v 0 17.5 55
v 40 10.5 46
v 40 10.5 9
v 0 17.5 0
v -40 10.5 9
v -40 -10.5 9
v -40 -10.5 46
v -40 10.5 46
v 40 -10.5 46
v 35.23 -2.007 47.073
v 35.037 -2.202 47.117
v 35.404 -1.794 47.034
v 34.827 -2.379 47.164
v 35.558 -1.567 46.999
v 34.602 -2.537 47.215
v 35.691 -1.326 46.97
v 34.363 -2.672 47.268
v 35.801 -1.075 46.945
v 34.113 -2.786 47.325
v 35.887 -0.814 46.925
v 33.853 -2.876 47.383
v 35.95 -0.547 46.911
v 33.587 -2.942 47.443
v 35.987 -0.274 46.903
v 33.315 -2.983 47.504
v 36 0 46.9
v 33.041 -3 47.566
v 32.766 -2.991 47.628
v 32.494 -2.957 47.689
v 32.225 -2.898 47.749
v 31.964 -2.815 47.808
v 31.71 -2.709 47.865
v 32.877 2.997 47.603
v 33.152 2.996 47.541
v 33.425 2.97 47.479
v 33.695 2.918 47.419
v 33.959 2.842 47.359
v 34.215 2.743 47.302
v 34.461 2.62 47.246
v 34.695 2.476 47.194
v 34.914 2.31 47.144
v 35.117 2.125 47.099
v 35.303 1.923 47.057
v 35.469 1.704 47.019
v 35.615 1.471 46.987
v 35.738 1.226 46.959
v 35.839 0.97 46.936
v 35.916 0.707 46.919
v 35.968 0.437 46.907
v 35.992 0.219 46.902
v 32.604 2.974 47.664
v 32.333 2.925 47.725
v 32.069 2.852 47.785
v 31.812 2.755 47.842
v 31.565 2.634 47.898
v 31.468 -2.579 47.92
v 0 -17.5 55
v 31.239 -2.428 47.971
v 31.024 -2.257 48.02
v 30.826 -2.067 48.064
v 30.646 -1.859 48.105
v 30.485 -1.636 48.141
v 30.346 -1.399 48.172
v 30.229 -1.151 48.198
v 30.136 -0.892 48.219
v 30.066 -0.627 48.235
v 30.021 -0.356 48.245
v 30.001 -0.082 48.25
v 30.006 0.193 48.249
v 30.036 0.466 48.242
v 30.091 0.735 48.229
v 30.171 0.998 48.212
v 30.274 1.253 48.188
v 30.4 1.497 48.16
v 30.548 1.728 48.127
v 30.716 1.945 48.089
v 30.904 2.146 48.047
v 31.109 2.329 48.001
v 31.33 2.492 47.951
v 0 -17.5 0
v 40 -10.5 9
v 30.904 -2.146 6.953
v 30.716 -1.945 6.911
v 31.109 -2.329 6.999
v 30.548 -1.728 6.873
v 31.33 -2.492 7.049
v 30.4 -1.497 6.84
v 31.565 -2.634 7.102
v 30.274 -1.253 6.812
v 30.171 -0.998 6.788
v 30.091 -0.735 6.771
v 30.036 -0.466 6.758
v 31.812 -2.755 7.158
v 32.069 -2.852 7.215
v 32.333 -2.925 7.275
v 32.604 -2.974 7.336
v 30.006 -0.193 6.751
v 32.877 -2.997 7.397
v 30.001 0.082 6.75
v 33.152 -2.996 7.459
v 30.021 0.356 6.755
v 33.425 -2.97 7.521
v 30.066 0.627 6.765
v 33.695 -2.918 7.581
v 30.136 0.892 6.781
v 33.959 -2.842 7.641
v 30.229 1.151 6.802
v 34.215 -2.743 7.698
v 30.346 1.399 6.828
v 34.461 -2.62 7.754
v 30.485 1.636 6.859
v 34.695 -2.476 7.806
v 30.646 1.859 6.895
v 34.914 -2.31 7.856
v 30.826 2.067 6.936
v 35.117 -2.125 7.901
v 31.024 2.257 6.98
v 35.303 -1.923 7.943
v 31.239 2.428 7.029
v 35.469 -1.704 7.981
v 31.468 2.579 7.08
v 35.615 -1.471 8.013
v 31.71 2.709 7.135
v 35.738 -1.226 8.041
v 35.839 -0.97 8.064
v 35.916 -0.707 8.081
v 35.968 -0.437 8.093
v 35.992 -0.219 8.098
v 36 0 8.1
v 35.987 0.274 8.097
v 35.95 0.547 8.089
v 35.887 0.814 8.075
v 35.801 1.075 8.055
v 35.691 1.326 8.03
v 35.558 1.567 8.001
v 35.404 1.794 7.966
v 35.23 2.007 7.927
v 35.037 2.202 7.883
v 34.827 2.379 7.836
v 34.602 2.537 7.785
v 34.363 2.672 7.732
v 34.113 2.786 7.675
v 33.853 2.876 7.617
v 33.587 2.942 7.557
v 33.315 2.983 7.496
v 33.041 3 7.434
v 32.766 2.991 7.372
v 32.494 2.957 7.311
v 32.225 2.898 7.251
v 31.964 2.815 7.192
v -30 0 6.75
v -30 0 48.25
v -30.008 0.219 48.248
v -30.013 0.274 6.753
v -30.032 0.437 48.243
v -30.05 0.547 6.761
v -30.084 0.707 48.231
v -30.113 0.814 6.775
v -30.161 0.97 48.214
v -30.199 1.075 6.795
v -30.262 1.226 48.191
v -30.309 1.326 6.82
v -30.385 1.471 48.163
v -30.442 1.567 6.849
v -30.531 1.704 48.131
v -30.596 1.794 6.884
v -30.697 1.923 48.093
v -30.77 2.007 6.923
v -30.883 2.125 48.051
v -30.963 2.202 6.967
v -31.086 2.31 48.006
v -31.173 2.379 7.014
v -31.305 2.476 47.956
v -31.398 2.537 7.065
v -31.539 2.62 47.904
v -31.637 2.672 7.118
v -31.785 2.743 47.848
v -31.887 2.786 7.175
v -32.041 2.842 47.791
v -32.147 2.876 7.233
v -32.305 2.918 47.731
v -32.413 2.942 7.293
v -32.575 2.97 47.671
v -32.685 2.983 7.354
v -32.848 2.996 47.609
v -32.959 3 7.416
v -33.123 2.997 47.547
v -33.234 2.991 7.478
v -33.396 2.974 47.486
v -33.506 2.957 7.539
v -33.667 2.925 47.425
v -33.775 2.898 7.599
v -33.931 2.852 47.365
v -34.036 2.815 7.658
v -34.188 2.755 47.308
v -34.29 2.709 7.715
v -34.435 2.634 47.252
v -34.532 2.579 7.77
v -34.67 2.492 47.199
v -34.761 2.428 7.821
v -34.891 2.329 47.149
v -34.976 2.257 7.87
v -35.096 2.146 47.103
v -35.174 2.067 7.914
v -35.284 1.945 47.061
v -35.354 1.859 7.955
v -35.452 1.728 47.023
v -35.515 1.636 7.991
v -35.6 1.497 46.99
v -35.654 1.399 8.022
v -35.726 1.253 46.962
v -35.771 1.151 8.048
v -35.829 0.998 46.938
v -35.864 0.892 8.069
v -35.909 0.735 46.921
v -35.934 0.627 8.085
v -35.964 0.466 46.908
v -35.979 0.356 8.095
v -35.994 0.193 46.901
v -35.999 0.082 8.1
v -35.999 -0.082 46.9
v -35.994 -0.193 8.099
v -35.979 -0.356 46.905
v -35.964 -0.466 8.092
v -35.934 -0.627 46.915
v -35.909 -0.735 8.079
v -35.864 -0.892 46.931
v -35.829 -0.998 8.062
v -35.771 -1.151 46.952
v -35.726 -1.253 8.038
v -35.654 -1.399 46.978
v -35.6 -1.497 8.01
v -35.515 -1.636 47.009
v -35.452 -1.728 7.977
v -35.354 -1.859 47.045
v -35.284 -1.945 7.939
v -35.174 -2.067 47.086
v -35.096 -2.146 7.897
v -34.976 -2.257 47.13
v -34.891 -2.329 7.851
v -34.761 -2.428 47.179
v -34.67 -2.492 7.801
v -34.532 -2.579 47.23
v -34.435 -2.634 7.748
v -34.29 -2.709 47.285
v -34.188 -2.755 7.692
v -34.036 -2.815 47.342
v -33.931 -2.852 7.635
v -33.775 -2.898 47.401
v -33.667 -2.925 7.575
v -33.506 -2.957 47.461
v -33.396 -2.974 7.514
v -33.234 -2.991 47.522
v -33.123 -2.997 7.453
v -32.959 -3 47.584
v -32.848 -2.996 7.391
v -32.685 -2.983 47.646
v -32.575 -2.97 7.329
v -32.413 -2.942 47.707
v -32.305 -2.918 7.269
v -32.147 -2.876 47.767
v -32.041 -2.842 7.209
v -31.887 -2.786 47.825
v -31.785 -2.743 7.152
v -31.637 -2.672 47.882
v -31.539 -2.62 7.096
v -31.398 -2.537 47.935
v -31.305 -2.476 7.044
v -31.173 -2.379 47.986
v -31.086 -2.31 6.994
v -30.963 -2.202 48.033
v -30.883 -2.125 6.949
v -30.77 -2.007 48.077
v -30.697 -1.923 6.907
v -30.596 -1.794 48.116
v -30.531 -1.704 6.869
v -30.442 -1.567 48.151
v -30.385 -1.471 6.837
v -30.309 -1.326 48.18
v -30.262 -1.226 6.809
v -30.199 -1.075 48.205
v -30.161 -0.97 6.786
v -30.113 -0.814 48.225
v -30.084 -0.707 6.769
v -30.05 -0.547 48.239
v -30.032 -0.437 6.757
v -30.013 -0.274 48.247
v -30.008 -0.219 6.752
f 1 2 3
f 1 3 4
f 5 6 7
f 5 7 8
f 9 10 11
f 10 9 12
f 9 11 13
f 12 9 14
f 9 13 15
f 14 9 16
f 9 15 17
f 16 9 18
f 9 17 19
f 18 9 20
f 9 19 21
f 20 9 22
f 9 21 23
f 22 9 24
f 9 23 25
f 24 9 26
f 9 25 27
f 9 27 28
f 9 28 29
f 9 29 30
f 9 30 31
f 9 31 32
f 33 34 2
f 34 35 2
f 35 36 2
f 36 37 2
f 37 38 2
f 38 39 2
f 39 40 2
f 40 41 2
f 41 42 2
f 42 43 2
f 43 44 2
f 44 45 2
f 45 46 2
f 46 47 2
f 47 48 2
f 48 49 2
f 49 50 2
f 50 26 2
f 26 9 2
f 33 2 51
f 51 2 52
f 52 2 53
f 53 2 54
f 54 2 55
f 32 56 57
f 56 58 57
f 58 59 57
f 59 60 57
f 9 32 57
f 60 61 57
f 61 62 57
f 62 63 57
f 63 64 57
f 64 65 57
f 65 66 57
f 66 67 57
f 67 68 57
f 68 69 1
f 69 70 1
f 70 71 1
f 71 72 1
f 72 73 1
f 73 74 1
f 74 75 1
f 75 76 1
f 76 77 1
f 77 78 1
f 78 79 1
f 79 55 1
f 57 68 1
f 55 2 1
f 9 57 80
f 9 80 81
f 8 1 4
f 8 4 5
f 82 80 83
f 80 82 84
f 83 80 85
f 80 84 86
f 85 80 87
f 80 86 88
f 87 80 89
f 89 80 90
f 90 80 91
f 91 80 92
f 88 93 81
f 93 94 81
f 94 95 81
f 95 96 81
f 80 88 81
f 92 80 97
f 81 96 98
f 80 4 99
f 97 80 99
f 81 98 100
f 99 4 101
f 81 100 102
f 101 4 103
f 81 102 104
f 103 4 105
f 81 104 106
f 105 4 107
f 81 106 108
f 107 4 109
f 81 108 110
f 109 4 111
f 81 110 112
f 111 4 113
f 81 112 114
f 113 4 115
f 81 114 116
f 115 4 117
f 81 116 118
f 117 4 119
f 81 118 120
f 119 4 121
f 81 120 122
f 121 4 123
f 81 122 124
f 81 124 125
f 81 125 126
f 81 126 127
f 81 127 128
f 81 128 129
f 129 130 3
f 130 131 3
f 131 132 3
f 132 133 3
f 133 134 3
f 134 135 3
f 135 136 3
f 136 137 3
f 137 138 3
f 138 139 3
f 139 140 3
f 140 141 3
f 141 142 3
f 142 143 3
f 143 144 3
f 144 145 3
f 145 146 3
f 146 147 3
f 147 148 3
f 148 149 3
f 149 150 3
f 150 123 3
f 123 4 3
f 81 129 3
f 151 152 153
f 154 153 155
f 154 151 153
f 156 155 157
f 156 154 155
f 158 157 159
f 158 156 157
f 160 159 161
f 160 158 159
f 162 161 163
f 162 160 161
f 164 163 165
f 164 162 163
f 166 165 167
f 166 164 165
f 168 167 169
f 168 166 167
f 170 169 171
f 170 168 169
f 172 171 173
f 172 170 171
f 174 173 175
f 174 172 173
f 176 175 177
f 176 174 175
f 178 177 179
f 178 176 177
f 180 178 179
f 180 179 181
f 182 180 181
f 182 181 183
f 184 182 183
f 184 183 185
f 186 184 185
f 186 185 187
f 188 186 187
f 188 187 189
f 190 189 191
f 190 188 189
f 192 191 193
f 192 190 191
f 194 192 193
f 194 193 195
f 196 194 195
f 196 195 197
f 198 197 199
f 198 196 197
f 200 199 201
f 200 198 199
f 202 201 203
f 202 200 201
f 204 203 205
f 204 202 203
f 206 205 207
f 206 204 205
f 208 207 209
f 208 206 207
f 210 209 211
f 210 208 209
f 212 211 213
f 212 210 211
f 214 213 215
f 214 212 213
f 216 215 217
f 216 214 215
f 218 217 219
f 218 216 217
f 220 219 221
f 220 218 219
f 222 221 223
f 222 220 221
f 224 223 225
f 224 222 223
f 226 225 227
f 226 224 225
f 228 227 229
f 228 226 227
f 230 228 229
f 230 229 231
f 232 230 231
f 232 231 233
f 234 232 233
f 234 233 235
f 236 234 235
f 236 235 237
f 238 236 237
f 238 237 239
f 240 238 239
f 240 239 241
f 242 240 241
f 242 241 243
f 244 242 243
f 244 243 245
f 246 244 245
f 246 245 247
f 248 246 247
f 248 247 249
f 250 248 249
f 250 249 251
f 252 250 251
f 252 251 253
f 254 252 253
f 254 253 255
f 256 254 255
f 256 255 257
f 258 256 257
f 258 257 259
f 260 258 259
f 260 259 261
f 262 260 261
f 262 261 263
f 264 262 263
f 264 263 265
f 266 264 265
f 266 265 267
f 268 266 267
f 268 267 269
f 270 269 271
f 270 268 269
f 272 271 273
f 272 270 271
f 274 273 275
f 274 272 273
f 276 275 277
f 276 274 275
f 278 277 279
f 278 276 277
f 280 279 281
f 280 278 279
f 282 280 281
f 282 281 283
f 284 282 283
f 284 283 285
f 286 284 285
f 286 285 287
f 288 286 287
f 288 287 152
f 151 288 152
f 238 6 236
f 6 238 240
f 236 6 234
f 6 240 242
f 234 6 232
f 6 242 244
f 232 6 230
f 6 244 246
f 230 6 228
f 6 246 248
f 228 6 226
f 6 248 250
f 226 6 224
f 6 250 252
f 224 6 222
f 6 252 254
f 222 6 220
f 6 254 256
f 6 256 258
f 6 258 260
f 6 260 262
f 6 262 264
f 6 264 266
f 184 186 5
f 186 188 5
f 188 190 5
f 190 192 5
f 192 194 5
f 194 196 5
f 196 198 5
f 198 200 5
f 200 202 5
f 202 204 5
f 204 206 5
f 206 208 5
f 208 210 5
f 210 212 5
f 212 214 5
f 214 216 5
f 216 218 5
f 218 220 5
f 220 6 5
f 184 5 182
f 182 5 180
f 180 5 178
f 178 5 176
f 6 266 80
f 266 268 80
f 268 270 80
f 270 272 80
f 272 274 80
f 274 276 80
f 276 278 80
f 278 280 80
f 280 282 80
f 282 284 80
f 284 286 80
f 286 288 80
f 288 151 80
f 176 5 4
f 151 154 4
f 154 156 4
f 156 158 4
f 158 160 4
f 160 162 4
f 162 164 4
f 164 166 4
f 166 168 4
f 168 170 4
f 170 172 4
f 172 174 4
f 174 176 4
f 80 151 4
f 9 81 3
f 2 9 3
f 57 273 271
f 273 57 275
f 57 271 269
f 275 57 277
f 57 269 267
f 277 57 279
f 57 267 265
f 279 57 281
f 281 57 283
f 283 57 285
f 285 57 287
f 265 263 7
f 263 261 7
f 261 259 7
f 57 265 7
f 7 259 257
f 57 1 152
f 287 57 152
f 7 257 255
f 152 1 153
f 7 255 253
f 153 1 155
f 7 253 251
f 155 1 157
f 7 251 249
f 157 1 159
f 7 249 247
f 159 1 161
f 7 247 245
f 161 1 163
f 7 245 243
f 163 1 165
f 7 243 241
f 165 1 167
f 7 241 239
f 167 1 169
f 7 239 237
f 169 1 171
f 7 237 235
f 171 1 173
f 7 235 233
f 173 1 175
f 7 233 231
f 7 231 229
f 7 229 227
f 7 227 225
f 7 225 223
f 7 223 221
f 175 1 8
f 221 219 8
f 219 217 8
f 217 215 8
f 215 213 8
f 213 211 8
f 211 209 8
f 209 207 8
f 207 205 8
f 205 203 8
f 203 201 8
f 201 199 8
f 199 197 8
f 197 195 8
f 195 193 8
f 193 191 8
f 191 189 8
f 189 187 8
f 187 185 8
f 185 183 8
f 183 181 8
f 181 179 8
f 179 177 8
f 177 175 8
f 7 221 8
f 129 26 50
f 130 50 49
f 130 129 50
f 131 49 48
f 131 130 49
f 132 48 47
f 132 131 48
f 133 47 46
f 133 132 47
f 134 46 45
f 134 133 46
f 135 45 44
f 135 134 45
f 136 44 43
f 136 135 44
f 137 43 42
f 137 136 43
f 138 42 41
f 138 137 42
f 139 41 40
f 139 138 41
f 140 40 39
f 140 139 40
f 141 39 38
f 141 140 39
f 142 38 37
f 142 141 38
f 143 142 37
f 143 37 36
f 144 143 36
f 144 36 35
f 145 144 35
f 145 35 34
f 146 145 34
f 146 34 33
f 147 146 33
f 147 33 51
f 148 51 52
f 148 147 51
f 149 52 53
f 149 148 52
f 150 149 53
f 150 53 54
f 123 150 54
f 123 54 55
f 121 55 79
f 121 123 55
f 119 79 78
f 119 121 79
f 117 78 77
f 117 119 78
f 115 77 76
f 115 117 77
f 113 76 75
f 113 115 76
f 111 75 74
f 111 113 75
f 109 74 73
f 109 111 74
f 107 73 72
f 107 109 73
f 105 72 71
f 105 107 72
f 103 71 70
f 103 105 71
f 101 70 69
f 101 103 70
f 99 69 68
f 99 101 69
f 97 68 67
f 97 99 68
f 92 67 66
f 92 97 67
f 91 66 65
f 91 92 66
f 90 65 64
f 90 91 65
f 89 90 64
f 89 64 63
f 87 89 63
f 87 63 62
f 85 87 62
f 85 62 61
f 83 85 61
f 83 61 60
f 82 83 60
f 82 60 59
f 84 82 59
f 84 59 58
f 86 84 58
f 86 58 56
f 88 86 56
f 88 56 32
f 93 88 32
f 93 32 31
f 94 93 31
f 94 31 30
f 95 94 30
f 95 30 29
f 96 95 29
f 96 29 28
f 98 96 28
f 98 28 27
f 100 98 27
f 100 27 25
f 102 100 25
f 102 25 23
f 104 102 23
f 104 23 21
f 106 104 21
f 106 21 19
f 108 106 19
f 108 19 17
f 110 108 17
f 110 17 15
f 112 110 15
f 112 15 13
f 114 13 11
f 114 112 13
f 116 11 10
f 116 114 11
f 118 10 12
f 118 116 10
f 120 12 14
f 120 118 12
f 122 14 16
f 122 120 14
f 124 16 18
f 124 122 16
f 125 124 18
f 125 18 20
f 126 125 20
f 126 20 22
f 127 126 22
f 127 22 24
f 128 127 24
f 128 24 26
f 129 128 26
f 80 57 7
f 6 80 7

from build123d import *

# Parameters (mm, degrees)
SKETCH1_W               = 80
SKETCH1_H               = 35
BOSS_EXTRUDE1_DEPTH     = 55
CUT_EXTRUDE1_DEPTH      = 55
CUT_EXTRUDE2_DEPTH      = 71.222859526
CUT_EXTRUDE2_DEPTH_BACK = 71.222859526
CUT_EXTRUDE3_DEPTH      = 71.222859526
CUT_EXTRUDE3_DEPTH_BACK = 71.222859526
SKETCH6_R               = 3


with BuildPart() as part:
    # Sketch1 → Boss-Extrude1 (new body)
    with BuildSketch(Plane.XY):
        Rectangle(SKETCH1_W, SKETCH1_H)
    extrude(amount=BOSS_EXTRUDE1_DEPTH)

    # Sketch2 → Cut-Extrude1 (cut)
    with BuildSketch(Plane(origin=(0, 17.5, 0), x_dir=(1, 0, 0), z_dir=(0, 1, 0))):
        Polygon((-40, -55), (0, -55), (-40, -46), align=None)
        Polygon((40, -46), (0, -55), (40, -55), align=None)
        Polygon((0, 0), (40, -9), (40, 0), align=None)
        Polygon((-40, 0), (-40, -9), (0, 0), align=None)
    extrude(amount=-CUT_EXTRUDE1_DEPTH, mode=Mode.SUBTRACT)

    # Sketch5 → Cut-Extrude2 (cut, two sides: drawn at the far end of the back side and taken through both)
    with BuildSketch(Plane.XY.offset(-CUT_EXTRUDE2_DEPTH_BACK)):
        Polygon((40, 17.5), (40, 10.5), (0, 17.5), align=None)
        Polygon((-40, 17.5), (0, 17.5), (-40, 10.5), align=None)
        Polygon((40, -17.5), (0, -17.5), (40, -10.5), align=None)
        Polygon((-40, -10.5), (-40, -17.5), (0, -17.5), align=None)
    extrude(amount=CUT_EXTRUDE2_DEPTH + CUT_EXTRUDE2_DEPTH_BACK, mode=Mode.SUBTRACT)

    # Sketch6 → Cut-Extrude3 (cut, two sides: drawn at the far end of the back side and taken through both)
    with BuildSketch(Plane.XY.offset(-CUT_EXTRUDE3_DEPTH_BACK)):
        with Locations((-33, 0)):
            Circle(SKETCH6_R)
        with Locations((33, 0)):
            Circle(SKETCH6_R)
    extrude(amount=CUT_EXTRUDE3_DEPTH + CUT_EXTRUDE3_DEPTH_BACK, mode=Mode.SUBTRACT)


solid = part.part
